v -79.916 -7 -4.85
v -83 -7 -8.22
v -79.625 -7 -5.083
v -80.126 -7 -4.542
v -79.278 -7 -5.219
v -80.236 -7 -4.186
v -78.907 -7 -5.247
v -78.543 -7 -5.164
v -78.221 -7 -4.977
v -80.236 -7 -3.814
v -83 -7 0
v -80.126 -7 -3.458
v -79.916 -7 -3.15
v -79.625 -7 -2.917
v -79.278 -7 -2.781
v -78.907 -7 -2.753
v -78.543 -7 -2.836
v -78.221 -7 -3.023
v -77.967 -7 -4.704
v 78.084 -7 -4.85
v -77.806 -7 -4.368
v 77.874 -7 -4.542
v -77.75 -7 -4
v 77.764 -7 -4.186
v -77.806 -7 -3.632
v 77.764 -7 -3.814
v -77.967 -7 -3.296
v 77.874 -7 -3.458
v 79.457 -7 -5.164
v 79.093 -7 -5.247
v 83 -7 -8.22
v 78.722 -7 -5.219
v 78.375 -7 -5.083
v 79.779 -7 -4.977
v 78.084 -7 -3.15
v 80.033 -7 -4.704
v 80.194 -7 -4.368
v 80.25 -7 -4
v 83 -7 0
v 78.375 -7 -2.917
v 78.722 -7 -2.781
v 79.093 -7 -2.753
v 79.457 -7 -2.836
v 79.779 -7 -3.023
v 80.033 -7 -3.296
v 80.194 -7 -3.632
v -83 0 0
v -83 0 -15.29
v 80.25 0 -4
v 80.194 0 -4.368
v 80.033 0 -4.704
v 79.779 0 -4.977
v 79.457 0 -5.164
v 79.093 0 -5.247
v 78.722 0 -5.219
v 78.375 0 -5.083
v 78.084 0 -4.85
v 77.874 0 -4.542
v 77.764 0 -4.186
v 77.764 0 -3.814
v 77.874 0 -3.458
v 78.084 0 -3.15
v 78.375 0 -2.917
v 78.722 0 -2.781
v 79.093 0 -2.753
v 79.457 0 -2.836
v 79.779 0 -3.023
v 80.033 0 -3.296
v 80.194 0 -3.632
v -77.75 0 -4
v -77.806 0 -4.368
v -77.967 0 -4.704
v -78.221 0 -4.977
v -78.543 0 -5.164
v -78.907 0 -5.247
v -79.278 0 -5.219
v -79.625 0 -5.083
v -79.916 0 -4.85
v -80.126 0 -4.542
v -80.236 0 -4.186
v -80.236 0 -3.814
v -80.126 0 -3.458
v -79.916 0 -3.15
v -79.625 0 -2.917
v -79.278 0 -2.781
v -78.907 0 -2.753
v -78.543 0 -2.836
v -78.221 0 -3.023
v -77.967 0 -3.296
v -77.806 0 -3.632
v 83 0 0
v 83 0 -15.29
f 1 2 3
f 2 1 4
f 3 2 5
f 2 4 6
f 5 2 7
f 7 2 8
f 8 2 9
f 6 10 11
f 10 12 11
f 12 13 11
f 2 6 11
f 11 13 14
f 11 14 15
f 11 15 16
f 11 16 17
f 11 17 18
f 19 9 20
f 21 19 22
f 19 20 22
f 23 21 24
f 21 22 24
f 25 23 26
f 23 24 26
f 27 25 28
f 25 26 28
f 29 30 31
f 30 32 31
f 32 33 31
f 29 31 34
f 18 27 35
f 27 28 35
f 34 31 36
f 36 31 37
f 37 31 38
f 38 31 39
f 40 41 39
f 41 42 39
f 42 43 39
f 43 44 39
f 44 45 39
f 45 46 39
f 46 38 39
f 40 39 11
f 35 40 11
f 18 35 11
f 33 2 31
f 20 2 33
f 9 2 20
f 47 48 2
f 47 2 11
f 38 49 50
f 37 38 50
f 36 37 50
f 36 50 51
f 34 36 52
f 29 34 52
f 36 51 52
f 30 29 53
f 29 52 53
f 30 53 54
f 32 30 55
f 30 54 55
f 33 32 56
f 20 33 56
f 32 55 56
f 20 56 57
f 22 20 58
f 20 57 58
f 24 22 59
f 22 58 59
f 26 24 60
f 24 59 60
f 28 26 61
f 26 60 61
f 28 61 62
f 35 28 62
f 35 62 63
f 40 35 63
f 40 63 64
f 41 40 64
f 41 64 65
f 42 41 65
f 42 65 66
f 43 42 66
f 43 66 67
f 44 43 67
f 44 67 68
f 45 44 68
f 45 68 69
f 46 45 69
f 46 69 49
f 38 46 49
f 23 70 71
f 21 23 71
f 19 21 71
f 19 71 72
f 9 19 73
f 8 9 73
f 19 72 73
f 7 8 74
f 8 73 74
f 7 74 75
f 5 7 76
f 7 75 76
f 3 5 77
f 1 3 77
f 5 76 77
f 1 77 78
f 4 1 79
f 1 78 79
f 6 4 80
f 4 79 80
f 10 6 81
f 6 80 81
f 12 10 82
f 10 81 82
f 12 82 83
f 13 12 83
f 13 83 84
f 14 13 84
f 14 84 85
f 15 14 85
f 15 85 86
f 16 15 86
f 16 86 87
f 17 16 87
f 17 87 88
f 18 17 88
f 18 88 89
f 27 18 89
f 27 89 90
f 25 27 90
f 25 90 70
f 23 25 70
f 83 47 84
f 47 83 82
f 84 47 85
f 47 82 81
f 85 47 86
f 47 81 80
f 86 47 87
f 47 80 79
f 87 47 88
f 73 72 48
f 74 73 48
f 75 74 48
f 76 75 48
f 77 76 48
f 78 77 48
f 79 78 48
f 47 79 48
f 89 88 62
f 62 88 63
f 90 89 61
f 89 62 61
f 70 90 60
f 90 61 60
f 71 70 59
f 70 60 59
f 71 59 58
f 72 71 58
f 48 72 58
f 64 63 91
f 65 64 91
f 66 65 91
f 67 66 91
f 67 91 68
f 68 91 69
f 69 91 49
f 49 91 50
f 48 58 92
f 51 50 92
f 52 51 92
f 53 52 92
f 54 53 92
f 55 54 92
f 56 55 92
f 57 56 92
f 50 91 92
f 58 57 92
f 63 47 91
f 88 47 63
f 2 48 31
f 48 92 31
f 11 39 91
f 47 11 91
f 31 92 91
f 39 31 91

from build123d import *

# Parameters (mm, degrees)
BOSS_EXTRUDE1_DEPTH   = 83
M3X0_5_TAPPED_HOLE1_D = 2.5


with BuildPart() as part:
    # Sketch2 → Boss-Extrude1 (new body, symmetric)
    with BuildSketch(Plane(origin=(0, 0, 0), x_dir=(0, 0, -1), z_dir=(1, 0, 0))):
        Polygon((0, 0), (15.29, 0), (8.22, -7), (0, -7), align=None)
    extrude(amount=BOSS_EXTRUDE1_DEPTH, both=True)

    # M3x0.5 Tapped Hole1 (through all)
    with Locations(Plane(origin=(0, -7, 0), x_dir=(-1, 0, 0), z_dir=(0, -1, 0))):
        with Locations((79, 4), (-79, 4)):
            Hole(M3X0_5_TAPPED_HOLE1_D / 2)


solid = part.part
